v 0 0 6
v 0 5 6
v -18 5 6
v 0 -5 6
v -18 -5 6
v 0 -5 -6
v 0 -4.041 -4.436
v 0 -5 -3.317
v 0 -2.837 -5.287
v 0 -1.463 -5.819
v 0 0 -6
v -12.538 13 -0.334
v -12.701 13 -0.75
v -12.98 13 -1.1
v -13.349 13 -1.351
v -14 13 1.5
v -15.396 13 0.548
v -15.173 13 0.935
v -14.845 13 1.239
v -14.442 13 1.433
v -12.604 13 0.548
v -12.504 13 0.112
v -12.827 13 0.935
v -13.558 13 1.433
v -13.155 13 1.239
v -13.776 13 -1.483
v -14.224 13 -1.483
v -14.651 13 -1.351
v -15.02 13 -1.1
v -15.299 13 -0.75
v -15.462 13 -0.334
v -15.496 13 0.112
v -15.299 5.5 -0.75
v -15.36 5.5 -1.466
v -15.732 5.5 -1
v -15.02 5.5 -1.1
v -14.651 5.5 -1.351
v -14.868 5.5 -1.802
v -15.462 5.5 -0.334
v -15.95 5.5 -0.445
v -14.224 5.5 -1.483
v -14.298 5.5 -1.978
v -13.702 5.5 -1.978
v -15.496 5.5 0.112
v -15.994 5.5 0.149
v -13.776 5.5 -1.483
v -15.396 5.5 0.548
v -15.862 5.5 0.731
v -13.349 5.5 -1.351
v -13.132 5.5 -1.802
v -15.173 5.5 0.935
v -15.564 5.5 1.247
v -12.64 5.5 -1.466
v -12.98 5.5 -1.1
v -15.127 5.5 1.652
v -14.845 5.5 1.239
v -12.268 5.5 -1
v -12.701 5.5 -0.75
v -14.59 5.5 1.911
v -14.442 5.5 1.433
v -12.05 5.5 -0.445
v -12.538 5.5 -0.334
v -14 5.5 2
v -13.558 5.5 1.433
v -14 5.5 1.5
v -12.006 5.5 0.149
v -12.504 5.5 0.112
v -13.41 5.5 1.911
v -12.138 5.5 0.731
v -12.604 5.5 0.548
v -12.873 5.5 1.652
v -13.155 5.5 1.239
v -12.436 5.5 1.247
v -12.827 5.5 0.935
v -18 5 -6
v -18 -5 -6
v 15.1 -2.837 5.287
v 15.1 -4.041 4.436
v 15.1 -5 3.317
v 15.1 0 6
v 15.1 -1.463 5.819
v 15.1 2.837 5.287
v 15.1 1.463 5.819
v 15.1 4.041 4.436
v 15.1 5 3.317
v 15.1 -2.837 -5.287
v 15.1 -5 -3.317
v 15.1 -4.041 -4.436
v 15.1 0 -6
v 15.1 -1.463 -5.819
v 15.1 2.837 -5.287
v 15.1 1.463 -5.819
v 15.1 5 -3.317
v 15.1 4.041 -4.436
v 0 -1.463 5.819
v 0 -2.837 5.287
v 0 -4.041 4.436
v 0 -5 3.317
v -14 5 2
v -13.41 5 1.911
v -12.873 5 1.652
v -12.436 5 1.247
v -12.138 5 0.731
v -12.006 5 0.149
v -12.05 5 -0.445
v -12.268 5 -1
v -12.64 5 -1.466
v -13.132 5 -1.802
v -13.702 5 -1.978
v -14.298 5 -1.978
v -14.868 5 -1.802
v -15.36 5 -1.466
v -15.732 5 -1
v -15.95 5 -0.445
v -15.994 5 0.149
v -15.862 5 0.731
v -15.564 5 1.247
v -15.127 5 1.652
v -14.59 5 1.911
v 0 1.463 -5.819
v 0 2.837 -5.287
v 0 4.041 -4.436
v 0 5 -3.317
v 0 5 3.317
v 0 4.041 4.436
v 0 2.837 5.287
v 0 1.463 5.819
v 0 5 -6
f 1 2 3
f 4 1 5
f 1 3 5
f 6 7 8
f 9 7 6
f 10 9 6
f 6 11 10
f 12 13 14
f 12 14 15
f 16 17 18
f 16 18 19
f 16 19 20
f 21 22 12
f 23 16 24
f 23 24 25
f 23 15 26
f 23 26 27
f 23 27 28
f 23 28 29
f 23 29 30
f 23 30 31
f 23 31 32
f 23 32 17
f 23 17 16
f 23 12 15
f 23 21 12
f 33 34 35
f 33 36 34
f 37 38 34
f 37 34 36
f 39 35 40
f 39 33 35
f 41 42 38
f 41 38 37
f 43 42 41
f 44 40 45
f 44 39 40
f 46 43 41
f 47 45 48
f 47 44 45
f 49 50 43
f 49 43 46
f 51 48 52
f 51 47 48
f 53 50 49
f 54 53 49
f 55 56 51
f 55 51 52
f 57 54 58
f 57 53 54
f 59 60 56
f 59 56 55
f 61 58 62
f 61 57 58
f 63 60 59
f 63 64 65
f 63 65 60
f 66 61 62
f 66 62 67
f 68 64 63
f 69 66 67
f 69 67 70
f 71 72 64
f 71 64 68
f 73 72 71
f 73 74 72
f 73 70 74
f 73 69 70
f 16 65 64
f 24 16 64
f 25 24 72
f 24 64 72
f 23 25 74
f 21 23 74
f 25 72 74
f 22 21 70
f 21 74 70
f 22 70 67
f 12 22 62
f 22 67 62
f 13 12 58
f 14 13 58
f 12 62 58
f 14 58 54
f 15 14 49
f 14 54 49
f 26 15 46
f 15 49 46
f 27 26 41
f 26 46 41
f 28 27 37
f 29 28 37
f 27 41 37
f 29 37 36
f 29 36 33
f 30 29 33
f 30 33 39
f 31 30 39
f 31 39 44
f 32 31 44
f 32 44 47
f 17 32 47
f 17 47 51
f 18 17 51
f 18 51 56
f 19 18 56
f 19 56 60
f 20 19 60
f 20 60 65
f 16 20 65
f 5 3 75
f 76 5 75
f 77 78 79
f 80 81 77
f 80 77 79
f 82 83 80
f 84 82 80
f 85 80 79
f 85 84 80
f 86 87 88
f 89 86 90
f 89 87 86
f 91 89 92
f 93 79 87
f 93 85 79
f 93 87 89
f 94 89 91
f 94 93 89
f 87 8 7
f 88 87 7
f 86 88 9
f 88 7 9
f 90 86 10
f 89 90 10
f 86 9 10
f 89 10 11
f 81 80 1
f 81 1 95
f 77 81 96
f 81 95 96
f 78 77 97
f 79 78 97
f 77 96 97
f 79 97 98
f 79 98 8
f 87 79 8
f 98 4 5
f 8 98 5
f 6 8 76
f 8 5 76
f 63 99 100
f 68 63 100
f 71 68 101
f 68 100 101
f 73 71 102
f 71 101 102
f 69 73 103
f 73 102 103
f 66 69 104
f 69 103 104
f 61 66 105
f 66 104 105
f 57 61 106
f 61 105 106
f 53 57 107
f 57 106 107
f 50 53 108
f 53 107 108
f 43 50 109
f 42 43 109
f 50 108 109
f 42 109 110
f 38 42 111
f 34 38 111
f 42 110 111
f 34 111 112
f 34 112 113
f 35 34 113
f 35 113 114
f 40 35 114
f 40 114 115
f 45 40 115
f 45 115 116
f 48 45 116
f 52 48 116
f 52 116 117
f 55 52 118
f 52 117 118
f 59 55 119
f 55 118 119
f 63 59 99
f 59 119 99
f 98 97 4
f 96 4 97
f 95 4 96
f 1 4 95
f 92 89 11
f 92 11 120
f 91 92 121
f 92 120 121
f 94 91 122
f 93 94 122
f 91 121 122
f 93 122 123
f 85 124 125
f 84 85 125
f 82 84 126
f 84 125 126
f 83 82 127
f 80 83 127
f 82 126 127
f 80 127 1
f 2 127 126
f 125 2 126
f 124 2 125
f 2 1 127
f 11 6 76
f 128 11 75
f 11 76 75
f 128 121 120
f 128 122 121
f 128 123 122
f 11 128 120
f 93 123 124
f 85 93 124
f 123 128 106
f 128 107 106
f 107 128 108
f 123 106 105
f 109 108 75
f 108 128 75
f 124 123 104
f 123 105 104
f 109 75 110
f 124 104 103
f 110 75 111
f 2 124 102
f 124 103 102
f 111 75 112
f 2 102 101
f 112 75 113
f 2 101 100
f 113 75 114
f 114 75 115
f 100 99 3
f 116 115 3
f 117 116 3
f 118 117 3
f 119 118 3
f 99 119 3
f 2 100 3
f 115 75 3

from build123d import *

# Parameters (mm, degrees)
BOSS_EXTRUDE1_DEPTH = 15.1
BOSS_EXTRUDE2_START = -18
BOSS_EXTRUDE2_DEPTH = 18
BOSS_EXTRUDE3_START = 5
SKETCH2_R           = 1.5
BOSS_EXTRUDE3_DEPTH = 8
BOSS_EXTRUDE4_START = 5
SKETCH2_3_R         = 2
SKETCH2_3_R_2       = 1.5
BOSS_EXTRUDE4_DEPTH = 0.5


with BuildPart() as part:
    # Sketch1 → Boss-Extrude1 (new body)
    with BuildSketch(Plane(origin=(0, 0, 0), x_dir=(0, 0, -1), z_dir=(1, 0, 0))):
        with BuildLine():
            Line((3.31662479, 5), (-3.31662479, 5))
            ThreePointArc((-3.31662479, 5), (-5.286764074, 2.837274331), (-6, 0))
            ThreePointArc((-6, 0), (-5.286764074, -2.837274331), (-3.31662479, -5))
            Line((-3.31662479, -5), (3.31662479, -5))
            ThreePointArc((3.31662479, -5), (5.286764074, -2.837274331), (6, 0))
            ThreePointArc((6, 0), (5.286764074, 2.837274331), (3.31662479, 5))
        make_face()
    extrude(amount=BOSS_EXTRUDE1_DEPTH)

    # Sketch1<3> → Boss-Extrude2 (add)
    with BuildSketch(Plane(origin=(0, 0, 0), x_dir=(0, 0, -1), z_dir=(1, 0, 0)).offset(BOSS_EXTRUDE2_START)):
        with BuildLine():
            Line((-3.31662479, 5), (-6, 5))
            Line((-6, 5), (-6, 0))
            ThreePointArc((-6, 0), (-5.286764074, 2.837274331), (-3.31662479, 5))
        make_face()
        with BuildLine():
            Line((3.31662479, 5), (-3.31662479, 5))
            ThreePointArc((-3.31662479, 5), (-5.286764074, 2.837274331), (-6, 0))
            ThreePointArc((-6, 0), (-5.286764074, -2.837274331), (-3.31662479, -5))
            Line((-3.31662479, -5), (3.31662479, -5))
            ThreePointArc((3.31662479, -5), (5.286764074, -2.837274331), (6, 0))
            ThreePointArc((6, 0), (5.286764074, 2.837274331), (3.31662479, 5))
        make_face()
        with BuildLine():
            Line((6, 5), (3.31662479, 5))
            ThreePointArc((3.31662479, 5), (5.286764074, 2.837274331), (6, 0))
            Line((6, 0), (6, 5))
        make_face()
        with BuildLine():
            ThreePointArc((-3.31662479, -5), (-5.286764074, -2.837274331), (-6, 0))
            Line((-6, 0), (-6, -5))
            Line((-6, -5), (-3.31662479, -5))
        make_face()
        with BuildLine():
            Line((6, -5), (6, 0))
            ThreePointArc((6, 0), (5.286764074, -2.837274331), (3.31662479, -5))
            Line((3.31662479, -5), (6, -5))
        make_face()
    extrude(amount=BOSS_EXTRUDE2_DEPTH)

    # Sketch2 → Boss-Extrude3 (add)
    with BuildSketch(Plane(origin=(0, 0, 0), x_dir=(1, 0, 0), z_dir=(0, 1, 0)).offset(BOSS_EXTRUDE3_START)):
        with Locations(Location((-14, 0, 0), (0, 0, 270))):
            Circle(SKETCH2_R)
    extrude(amount=BOSS_EXTRUDE3_DEPTH)

    # Sketch2<3> → Boss-Extrude4 (add)
    with BuildSketch(Plane(origin=(0, 0, 0), x_dir=(1, 0, 0), z_dir=(0, 1, 0)).offset(BOSS_EXTRUDE4_START)):
        with Locations(Location((-14, 0, 0), (0, 0, 270))):
            Circle(SKETCH2_3_R)
        with Locations(Location((-14, 0, 0), (0, 0, 270))):
            Circle(SKETCH2_3_R_2, mode=Mode.SUBTRACT)
    extrude(amount=BOSS_EXTRUDE4_DEPTH)


solid = part.part
